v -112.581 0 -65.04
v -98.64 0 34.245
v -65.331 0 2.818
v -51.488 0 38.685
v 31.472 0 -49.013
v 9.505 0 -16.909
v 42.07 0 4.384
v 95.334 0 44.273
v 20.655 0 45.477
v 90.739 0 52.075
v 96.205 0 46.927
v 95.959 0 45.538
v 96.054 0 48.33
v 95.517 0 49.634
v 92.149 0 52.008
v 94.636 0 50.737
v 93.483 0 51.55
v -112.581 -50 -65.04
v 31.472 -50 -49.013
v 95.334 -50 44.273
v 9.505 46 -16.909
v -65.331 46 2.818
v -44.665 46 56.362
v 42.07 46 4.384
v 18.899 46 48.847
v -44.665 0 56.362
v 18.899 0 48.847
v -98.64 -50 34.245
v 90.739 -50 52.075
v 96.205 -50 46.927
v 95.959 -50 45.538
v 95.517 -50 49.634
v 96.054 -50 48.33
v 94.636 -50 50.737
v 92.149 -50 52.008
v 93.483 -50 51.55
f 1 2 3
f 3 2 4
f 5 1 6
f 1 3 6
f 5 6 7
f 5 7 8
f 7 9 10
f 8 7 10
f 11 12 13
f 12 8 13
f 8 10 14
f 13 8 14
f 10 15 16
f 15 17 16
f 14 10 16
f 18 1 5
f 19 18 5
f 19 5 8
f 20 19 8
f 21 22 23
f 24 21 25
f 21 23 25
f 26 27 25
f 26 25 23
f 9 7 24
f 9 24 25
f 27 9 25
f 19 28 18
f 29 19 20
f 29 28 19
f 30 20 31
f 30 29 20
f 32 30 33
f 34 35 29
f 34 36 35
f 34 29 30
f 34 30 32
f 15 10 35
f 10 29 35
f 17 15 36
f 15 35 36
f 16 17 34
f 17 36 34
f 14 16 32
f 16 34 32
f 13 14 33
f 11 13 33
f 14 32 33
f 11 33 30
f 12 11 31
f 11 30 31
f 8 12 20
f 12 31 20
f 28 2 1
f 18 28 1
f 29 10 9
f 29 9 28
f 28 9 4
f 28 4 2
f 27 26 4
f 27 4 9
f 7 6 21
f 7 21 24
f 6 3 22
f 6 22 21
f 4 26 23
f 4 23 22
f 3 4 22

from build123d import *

# Parameters (mm, degrees)
F1_DEPTH = 30
F4_DEPTH = 50
F5_R     = 5
F7_DEPTH = 46


with BuildPart() as f1:
    # F0 (on Front) → F1 (new body)
    with BuildSketch(Plane.XZ):
        Polygon((26.3627171516, 40.0704815984), (-62.9477128386, 36.8853881955), (-46.8072779477, -22.2996752709), (34.61227566, -16.0123351961), align=None)
    extrude(amount=F1_DEPTH)


with BuildPart() as f4:
    # F3 (on Front) → F4 (new body)
    with BuildSketch(Plane.XZ):
        Polygon((101.3598069549, 53.0752539635), (-98.6401930451, 34.245274961), (-112.5807955861, -65.0398209691), (31.4720973372, -49.0130968392), align=None)
    extrude(amount=F4_DEPTH)

    # F5
    f5_edges = [f4.edges().sort_by_distance(p)[0] for p in [
        (101.359807, -25, 53.075254),
    ]]
    fillet(f5_edges, radius=F5_R)

    # F6 (on Front) → F7 (join)
    with BuildSketch(Plane.XZ):
        Polygon((18.8986193389, 48.8469228148), (-44.6650013328, 56.3618317246), (-65.33100456, 2.8180915397), (9.5049822703, -16.9085487723), (42.0695990324, 4.3836981058), align=None)
    extrude(amount=-F7_DEPTH)


solid = f4.part
